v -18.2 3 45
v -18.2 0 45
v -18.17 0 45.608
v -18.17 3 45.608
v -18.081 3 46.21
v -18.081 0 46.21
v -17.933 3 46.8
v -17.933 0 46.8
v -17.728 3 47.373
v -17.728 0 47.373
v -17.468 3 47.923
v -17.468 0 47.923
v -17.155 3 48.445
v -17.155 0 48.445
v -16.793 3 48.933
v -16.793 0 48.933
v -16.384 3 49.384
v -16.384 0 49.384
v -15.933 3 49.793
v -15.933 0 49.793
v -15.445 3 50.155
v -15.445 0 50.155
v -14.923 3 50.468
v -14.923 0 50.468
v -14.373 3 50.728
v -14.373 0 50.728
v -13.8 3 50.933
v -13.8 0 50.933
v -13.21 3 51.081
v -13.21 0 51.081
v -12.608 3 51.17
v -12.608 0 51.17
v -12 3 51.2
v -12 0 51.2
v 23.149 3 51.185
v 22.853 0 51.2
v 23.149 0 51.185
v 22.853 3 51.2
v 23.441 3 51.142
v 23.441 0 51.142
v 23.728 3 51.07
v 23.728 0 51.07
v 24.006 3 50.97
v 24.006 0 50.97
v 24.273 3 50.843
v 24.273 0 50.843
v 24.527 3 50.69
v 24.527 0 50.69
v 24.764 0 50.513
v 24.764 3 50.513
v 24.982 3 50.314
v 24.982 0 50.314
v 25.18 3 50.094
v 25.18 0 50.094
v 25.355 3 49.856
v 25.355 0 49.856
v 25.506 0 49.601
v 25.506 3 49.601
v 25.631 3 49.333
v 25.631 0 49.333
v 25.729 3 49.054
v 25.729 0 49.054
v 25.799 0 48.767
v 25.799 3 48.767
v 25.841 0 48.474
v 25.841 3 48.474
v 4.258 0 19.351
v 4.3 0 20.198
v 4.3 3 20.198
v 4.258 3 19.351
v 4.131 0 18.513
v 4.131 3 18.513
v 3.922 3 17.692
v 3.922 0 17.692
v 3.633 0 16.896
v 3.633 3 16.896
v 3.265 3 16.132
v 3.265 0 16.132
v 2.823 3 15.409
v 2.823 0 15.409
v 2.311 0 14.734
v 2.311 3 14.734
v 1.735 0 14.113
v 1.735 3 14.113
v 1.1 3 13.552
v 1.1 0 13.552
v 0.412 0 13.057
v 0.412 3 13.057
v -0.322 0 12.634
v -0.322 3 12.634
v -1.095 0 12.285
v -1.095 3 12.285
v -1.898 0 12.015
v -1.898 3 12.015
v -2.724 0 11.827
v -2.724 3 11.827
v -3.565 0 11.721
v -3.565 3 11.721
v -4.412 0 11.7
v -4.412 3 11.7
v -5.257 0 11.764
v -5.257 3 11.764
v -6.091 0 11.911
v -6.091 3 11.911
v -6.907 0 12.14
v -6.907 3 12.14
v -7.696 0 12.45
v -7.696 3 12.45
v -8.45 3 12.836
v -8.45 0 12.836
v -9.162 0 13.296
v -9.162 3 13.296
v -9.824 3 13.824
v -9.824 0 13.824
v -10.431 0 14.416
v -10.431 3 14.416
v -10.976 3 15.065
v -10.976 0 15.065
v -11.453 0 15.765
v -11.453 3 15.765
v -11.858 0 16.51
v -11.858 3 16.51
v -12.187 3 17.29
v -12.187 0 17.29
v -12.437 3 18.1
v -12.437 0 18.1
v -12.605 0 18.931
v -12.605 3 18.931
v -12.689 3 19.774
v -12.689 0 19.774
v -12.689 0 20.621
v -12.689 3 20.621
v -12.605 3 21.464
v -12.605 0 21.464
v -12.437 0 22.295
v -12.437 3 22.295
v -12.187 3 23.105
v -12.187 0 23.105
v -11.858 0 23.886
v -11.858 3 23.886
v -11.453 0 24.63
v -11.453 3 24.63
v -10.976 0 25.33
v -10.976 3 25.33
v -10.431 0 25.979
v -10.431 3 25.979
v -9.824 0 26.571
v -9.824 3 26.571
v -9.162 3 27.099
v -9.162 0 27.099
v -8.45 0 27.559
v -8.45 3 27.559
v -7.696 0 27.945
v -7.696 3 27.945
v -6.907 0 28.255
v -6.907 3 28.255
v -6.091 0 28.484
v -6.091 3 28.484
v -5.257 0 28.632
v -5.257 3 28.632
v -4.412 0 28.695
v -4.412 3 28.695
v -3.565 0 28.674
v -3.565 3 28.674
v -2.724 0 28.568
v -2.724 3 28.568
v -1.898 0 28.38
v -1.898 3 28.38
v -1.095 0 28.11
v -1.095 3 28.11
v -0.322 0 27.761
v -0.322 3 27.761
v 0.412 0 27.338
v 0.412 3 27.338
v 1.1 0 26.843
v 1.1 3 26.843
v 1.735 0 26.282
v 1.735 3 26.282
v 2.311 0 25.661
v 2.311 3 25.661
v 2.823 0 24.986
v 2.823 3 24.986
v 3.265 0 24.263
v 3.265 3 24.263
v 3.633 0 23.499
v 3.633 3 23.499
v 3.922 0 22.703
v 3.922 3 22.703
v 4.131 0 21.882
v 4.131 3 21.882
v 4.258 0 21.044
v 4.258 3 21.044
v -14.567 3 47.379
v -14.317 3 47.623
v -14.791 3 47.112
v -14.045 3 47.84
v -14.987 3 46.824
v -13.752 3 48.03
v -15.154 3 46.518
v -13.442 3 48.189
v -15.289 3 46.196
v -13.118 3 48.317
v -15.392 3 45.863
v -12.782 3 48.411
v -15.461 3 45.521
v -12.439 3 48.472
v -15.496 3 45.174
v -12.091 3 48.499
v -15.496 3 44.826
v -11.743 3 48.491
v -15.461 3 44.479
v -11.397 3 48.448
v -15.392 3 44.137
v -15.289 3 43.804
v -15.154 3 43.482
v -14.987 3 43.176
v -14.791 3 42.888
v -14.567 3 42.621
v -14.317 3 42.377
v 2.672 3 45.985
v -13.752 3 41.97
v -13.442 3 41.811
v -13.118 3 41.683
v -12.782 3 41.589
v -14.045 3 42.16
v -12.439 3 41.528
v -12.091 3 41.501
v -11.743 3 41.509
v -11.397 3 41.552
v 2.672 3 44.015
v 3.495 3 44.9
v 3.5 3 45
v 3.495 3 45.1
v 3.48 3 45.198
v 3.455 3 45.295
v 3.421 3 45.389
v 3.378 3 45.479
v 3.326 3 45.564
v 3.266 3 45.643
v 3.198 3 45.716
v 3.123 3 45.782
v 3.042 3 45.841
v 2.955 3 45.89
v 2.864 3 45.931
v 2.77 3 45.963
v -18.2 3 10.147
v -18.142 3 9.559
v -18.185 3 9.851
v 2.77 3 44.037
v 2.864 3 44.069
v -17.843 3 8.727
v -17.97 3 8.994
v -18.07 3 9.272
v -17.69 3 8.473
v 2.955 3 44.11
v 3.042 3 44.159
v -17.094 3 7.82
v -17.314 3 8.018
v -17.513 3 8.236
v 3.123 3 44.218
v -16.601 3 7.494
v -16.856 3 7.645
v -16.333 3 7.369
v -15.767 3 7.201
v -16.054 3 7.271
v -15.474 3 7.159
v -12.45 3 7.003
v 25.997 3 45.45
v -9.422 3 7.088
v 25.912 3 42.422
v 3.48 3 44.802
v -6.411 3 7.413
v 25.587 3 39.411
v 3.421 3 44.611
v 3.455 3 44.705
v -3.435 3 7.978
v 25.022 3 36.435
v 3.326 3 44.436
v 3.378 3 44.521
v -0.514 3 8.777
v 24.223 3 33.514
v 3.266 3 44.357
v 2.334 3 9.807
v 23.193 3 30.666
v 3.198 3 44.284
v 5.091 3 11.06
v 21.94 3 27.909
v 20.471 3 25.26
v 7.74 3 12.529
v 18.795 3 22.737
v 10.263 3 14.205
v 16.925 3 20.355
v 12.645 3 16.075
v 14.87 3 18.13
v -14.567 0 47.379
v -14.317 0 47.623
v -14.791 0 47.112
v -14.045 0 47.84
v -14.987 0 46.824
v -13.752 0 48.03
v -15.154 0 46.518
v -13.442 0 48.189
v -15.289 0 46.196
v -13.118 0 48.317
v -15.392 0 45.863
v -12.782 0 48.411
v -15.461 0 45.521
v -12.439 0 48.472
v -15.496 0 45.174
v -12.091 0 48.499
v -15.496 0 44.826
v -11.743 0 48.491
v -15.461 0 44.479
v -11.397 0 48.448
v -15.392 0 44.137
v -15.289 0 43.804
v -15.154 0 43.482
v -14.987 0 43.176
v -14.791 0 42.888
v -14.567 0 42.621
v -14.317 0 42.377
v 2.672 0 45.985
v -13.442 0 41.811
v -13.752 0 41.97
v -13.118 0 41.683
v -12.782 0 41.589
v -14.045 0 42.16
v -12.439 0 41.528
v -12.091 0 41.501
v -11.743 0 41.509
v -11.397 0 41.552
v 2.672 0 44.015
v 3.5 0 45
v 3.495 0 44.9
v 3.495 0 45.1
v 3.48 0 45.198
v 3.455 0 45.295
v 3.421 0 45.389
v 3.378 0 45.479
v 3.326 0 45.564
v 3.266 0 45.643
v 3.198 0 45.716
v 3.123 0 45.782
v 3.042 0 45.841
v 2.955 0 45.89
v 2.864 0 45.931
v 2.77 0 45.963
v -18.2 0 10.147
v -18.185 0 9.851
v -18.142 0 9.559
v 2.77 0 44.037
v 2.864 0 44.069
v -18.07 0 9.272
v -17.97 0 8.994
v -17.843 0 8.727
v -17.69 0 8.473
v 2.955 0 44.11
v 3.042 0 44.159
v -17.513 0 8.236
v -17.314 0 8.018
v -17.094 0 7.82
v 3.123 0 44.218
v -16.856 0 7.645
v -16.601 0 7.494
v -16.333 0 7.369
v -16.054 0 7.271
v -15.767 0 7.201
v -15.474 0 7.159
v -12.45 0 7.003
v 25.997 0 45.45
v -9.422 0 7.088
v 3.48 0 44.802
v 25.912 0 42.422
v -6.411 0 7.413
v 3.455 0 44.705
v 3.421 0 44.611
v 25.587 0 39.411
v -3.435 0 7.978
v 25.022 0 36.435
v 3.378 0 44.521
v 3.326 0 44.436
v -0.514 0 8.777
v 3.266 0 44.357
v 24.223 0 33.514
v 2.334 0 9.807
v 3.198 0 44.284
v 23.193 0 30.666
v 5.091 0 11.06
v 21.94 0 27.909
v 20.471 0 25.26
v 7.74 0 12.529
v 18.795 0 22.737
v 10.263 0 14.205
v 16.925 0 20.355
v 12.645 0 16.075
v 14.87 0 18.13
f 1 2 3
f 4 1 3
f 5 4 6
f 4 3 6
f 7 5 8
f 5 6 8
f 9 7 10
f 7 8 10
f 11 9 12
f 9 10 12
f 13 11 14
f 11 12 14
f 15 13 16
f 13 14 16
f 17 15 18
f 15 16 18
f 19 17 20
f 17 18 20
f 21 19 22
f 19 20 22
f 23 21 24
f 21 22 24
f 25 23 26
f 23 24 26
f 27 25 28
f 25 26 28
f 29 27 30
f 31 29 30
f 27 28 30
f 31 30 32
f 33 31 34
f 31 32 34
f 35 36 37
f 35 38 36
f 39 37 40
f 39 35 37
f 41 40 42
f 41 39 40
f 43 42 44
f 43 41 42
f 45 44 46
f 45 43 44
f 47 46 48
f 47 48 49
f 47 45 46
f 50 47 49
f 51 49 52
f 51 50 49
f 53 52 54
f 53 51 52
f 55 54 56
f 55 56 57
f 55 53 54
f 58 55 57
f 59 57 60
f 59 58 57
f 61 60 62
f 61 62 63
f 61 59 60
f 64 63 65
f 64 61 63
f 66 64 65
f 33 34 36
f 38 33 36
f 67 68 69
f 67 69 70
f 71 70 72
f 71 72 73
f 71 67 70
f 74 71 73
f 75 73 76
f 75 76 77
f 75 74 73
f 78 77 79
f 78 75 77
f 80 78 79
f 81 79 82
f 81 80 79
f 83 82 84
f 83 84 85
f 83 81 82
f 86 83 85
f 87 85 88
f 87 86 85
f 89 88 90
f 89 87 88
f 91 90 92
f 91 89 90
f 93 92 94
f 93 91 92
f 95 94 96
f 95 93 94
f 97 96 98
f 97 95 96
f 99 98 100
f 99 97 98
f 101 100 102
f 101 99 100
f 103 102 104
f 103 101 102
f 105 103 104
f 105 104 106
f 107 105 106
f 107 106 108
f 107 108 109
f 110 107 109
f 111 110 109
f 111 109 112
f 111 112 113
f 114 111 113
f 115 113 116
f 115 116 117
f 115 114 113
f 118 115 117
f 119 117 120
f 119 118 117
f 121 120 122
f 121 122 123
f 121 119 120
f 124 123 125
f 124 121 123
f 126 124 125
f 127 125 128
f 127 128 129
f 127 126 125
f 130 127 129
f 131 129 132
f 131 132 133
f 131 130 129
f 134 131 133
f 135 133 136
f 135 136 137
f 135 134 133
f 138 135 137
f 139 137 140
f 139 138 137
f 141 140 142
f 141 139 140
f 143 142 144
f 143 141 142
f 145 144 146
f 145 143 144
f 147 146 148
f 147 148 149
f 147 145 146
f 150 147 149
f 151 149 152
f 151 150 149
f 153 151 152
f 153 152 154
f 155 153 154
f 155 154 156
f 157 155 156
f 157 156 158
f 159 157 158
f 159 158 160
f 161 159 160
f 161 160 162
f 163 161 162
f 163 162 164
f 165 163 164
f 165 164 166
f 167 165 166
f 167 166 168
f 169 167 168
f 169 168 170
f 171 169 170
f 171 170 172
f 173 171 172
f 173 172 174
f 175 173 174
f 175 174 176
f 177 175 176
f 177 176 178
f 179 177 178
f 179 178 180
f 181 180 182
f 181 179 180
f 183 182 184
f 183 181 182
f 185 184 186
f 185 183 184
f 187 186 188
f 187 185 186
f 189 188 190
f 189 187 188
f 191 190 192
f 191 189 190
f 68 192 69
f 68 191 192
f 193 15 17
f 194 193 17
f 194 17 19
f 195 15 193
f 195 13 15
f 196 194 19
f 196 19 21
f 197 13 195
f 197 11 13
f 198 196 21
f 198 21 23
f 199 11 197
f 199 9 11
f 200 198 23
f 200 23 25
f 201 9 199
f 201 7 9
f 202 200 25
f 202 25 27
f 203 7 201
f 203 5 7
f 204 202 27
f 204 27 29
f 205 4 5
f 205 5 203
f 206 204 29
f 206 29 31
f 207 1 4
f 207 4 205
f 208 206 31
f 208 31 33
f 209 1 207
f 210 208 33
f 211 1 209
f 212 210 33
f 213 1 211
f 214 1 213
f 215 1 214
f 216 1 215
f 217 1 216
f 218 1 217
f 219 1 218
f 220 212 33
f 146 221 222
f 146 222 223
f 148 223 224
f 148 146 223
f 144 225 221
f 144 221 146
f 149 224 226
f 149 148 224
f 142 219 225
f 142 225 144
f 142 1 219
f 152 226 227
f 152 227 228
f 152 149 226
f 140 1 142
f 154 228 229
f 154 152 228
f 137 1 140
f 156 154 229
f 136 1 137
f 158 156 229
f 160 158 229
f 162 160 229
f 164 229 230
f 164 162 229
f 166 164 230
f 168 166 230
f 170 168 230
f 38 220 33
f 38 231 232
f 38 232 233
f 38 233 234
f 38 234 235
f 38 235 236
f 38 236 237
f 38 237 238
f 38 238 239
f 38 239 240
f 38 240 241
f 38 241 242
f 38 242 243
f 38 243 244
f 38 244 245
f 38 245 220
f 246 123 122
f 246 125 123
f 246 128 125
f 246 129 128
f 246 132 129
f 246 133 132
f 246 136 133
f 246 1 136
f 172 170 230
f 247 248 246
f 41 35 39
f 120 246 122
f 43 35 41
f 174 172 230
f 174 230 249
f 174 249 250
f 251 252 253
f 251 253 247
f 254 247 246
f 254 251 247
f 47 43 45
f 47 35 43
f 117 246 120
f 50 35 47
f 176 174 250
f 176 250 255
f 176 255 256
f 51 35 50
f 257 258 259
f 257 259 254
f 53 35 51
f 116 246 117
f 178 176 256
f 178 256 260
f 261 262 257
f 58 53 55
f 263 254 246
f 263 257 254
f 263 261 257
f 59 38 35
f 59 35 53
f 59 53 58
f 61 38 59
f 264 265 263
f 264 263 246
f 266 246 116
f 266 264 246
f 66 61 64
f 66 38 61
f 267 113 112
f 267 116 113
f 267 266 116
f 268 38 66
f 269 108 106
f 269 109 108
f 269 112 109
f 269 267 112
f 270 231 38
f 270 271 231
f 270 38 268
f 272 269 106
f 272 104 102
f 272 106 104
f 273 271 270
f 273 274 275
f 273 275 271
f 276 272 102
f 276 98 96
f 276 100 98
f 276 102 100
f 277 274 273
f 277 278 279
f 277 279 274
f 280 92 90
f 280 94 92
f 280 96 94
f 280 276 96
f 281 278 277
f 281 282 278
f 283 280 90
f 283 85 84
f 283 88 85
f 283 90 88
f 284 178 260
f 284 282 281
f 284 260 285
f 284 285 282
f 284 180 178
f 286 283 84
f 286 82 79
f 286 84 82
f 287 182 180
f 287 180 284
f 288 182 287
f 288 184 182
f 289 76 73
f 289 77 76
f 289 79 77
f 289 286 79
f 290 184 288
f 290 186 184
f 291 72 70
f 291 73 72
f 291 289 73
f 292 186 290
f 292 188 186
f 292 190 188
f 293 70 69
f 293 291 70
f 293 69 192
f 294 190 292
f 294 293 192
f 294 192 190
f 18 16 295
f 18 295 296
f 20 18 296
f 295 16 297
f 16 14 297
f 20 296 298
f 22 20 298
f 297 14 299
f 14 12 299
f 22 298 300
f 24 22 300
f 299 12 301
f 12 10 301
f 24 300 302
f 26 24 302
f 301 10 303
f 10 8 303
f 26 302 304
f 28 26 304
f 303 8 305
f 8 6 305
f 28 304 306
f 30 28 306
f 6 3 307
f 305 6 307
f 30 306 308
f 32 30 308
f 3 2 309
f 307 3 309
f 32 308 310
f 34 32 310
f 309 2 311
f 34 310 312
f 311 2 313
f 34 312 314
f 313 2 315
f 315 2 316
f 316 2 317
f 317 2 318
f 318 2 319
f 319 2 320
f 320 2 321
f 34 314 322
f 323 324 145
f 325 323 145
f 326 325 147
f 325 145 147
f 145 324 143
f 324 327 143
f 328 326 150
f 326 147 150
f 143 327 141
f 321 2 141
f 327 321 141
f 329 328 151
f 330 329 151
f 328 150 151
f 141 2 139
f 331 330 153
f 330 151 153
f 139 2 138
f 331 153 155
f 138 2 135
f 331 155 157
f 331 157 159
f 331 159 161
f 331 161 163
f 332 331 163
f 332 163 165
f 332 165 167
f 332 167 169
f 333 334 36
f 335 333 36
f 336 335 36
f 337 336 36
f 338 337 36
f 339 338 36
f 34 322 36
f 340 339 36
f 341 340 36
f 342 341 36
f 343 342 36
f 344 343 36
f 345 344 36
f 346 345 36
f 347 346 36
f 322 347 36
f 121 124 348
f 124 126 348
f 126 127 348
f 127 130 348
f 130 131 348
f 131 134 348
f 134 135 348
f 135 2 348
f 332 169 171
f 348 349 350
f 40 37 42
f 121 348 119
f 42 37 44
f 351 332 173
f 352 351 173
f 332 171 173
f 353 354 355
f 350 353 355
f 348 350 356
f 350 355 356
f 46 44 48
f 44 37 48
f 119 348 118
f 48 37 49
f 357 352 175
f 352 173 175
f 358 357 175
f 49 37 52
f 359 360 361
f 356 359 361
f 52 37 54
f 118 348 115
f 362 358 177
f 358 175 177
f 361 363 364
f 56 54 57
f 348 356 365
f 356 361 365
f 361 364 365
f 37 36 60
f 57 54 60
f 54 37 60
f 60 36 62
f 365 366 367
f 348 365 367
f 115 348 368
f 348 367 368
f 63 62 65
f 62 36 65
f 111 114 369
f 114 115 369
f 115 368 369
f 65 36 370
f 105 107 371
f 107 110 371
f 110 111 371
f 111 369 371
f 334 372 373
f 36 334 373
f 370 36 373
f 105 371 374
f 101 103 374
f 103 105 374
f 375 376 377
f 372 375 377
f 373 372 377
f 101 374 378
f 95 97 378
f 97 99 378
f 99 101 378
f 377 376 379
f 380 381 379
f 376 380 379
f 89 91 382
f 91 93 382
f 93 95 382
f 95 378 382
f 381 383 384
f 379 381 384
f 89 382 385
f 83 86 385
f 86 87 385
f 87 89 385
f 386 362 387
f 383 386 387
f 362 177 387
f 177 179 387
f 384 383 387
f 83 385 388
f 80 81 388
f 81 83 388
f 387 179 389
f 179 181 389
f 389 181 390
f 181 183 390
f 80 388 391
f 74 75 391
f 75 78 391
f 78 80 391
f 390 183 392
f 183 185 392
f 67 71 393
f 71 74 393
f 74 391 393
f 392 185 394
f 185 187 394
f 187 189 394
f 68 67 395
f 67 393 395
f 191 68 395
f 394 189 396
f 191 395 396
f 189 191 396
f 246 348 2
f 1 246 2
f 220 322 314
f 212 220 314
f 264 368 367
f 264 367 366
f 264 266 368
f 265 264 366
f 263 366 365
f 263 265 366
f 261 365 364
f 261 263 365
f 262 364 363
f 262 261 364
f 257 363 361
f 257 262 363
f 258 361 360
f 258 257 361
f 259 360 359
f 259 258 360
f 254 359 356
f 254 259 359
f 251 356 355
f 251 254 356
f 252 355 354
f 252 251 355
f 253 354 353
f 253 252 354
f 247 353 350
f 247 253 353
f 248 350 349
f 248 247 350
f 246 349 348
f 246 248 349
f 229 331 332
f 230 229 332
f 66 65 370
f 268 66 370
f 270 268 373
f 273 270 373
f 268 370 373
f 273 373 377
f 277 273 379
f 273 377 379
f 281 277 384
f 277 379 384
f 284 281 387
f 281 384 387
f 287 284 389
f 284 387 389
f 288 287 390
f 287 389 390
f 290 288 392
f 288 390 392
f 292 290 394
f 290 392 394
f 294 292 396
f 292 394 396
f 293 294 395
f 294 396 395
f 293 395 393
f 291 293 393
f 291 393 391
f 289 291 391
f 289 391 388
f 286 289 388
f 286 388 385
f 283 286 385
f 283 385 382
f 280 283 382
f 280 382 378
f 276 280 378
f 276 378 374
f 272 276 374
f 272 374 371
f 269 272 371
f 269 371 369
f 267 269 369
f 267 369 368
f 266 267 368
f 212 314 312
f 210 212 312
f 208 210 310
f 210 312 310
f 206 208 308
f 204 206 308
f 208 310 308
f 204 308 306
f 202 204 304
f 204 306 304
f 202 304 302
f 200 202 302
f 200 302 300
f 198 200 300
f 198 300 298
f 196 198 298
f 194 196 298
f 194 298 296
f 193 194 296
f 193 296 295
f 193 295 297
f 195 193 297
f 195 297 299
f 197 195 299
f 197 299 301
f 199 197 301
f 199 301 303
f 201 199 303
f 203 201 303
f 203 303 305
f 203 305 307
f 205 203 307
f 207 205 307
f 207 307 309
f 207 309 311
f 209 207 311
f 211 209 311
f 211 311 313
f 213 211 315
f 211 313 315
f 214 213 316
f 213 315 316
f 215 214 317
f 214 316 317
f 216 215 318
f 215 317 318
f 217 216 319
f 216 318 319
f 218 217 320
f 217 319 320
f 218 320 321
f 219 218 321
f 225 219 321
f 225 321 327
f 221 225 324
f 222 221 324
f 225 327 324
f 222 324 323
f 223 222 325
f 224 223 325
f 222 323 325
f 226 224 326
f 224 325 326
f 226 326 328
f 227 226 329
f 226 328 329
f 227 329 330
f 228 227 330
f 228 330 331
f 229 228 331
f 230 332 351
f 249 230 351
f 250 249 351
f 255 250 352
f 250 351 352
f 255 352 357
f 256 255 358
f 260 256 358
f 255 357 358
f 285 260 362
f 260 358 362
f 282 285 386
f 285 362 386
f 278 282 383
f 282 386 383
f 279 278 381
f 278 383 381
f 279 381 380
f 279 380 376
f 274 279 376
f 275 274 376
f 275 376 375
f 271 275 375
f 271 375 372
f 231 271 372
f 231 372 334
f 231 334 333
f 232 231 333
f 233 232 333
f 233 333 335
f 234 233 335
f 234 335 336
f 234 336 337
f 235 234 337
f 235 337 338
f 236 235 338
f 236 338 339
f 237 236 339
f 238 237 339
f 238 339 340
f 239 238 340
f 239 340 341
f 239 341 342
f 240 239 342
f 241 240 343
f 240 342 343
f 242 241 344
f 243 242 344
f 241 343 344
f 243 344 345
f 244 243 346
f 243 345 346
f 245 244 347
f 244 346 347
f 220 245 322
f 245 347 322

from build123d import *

# Parameters (mm, degrees)
SKETCH8_R           = 1.5
SKETCH8_R_2         = 8.5
BOSS_EXTRUDE3_DEPTH = 3
CUT_EXTRUDE3_DEPTH  = 4
FILLET1_R           = 3


with BuildPart() as part:
    # Sketch8 → Boss-Extrude3 (new body)
    with BuildSketch(Plane(origin=(0, 0, 0), x_dir=(1, 0, 0), z_dir=(0, 1, 0))):
        with BuildLine():
            Line((-12, -51.2), (25.490798871, -51.2))
            ThreePointArc((25.490798871, -51.2), (14.870057685, -18.129942315), (-18.2, -7.509201129))
            Line((-18.2, -7.509201129), (-18.2, -45))
            ThreePointArc((-18.2, -45), (-16.384062043, -49.384062043), (-12, -51.2))
        make_face()
        with Locations((-12, -45)):
            Circle(SKETCH8_R, mode=Mode.SUBTRACT)
        with Locations((-4.2, -20.197580763)):
            Circle(SKETCH8_R_2, mode=Mode.SUBTRACT)
    extrude(amount=BOSS_EXTRUDE3_DEPTH)

    # Sketch10 → Cut-Extrude3 (cut, through all)
    with BuildSketch(Plane(origin=(0, 0, 0), x_dir=(1, 0, 0), z_dir=(0, 1, 0))):
        with BuildLine():
            Line((-11.396551724, -41.552413862), (2.672413793, -44.014975389))
            ThreePointArc((2.672413793, -44.014975389), (3.5, -45), (2.672413793, -45.985024611))
            Line((2.672413793, -45.985024611), (-11.396551724, -48.447586138))
            ThreePointArc((-11.396551724, -48.447586138), (-15.5, -45), (-11.396551724, -41.552413862))
        make_face()
    extrude(amount=CUT_EXTRUDE3_DEPTH, mode=Mode.SUBTRACT)

    # Fillet1
    fillet1_edges = [part.edges().sort_by_distance(p)[0] for p in [
        (-18.2, 1.5, 7.509201129),
        (25.490798871, 1.5, 51.2),
    ]]
    fillet(fillet1_edges, radius=FILLET1_R)


solid = part.part
